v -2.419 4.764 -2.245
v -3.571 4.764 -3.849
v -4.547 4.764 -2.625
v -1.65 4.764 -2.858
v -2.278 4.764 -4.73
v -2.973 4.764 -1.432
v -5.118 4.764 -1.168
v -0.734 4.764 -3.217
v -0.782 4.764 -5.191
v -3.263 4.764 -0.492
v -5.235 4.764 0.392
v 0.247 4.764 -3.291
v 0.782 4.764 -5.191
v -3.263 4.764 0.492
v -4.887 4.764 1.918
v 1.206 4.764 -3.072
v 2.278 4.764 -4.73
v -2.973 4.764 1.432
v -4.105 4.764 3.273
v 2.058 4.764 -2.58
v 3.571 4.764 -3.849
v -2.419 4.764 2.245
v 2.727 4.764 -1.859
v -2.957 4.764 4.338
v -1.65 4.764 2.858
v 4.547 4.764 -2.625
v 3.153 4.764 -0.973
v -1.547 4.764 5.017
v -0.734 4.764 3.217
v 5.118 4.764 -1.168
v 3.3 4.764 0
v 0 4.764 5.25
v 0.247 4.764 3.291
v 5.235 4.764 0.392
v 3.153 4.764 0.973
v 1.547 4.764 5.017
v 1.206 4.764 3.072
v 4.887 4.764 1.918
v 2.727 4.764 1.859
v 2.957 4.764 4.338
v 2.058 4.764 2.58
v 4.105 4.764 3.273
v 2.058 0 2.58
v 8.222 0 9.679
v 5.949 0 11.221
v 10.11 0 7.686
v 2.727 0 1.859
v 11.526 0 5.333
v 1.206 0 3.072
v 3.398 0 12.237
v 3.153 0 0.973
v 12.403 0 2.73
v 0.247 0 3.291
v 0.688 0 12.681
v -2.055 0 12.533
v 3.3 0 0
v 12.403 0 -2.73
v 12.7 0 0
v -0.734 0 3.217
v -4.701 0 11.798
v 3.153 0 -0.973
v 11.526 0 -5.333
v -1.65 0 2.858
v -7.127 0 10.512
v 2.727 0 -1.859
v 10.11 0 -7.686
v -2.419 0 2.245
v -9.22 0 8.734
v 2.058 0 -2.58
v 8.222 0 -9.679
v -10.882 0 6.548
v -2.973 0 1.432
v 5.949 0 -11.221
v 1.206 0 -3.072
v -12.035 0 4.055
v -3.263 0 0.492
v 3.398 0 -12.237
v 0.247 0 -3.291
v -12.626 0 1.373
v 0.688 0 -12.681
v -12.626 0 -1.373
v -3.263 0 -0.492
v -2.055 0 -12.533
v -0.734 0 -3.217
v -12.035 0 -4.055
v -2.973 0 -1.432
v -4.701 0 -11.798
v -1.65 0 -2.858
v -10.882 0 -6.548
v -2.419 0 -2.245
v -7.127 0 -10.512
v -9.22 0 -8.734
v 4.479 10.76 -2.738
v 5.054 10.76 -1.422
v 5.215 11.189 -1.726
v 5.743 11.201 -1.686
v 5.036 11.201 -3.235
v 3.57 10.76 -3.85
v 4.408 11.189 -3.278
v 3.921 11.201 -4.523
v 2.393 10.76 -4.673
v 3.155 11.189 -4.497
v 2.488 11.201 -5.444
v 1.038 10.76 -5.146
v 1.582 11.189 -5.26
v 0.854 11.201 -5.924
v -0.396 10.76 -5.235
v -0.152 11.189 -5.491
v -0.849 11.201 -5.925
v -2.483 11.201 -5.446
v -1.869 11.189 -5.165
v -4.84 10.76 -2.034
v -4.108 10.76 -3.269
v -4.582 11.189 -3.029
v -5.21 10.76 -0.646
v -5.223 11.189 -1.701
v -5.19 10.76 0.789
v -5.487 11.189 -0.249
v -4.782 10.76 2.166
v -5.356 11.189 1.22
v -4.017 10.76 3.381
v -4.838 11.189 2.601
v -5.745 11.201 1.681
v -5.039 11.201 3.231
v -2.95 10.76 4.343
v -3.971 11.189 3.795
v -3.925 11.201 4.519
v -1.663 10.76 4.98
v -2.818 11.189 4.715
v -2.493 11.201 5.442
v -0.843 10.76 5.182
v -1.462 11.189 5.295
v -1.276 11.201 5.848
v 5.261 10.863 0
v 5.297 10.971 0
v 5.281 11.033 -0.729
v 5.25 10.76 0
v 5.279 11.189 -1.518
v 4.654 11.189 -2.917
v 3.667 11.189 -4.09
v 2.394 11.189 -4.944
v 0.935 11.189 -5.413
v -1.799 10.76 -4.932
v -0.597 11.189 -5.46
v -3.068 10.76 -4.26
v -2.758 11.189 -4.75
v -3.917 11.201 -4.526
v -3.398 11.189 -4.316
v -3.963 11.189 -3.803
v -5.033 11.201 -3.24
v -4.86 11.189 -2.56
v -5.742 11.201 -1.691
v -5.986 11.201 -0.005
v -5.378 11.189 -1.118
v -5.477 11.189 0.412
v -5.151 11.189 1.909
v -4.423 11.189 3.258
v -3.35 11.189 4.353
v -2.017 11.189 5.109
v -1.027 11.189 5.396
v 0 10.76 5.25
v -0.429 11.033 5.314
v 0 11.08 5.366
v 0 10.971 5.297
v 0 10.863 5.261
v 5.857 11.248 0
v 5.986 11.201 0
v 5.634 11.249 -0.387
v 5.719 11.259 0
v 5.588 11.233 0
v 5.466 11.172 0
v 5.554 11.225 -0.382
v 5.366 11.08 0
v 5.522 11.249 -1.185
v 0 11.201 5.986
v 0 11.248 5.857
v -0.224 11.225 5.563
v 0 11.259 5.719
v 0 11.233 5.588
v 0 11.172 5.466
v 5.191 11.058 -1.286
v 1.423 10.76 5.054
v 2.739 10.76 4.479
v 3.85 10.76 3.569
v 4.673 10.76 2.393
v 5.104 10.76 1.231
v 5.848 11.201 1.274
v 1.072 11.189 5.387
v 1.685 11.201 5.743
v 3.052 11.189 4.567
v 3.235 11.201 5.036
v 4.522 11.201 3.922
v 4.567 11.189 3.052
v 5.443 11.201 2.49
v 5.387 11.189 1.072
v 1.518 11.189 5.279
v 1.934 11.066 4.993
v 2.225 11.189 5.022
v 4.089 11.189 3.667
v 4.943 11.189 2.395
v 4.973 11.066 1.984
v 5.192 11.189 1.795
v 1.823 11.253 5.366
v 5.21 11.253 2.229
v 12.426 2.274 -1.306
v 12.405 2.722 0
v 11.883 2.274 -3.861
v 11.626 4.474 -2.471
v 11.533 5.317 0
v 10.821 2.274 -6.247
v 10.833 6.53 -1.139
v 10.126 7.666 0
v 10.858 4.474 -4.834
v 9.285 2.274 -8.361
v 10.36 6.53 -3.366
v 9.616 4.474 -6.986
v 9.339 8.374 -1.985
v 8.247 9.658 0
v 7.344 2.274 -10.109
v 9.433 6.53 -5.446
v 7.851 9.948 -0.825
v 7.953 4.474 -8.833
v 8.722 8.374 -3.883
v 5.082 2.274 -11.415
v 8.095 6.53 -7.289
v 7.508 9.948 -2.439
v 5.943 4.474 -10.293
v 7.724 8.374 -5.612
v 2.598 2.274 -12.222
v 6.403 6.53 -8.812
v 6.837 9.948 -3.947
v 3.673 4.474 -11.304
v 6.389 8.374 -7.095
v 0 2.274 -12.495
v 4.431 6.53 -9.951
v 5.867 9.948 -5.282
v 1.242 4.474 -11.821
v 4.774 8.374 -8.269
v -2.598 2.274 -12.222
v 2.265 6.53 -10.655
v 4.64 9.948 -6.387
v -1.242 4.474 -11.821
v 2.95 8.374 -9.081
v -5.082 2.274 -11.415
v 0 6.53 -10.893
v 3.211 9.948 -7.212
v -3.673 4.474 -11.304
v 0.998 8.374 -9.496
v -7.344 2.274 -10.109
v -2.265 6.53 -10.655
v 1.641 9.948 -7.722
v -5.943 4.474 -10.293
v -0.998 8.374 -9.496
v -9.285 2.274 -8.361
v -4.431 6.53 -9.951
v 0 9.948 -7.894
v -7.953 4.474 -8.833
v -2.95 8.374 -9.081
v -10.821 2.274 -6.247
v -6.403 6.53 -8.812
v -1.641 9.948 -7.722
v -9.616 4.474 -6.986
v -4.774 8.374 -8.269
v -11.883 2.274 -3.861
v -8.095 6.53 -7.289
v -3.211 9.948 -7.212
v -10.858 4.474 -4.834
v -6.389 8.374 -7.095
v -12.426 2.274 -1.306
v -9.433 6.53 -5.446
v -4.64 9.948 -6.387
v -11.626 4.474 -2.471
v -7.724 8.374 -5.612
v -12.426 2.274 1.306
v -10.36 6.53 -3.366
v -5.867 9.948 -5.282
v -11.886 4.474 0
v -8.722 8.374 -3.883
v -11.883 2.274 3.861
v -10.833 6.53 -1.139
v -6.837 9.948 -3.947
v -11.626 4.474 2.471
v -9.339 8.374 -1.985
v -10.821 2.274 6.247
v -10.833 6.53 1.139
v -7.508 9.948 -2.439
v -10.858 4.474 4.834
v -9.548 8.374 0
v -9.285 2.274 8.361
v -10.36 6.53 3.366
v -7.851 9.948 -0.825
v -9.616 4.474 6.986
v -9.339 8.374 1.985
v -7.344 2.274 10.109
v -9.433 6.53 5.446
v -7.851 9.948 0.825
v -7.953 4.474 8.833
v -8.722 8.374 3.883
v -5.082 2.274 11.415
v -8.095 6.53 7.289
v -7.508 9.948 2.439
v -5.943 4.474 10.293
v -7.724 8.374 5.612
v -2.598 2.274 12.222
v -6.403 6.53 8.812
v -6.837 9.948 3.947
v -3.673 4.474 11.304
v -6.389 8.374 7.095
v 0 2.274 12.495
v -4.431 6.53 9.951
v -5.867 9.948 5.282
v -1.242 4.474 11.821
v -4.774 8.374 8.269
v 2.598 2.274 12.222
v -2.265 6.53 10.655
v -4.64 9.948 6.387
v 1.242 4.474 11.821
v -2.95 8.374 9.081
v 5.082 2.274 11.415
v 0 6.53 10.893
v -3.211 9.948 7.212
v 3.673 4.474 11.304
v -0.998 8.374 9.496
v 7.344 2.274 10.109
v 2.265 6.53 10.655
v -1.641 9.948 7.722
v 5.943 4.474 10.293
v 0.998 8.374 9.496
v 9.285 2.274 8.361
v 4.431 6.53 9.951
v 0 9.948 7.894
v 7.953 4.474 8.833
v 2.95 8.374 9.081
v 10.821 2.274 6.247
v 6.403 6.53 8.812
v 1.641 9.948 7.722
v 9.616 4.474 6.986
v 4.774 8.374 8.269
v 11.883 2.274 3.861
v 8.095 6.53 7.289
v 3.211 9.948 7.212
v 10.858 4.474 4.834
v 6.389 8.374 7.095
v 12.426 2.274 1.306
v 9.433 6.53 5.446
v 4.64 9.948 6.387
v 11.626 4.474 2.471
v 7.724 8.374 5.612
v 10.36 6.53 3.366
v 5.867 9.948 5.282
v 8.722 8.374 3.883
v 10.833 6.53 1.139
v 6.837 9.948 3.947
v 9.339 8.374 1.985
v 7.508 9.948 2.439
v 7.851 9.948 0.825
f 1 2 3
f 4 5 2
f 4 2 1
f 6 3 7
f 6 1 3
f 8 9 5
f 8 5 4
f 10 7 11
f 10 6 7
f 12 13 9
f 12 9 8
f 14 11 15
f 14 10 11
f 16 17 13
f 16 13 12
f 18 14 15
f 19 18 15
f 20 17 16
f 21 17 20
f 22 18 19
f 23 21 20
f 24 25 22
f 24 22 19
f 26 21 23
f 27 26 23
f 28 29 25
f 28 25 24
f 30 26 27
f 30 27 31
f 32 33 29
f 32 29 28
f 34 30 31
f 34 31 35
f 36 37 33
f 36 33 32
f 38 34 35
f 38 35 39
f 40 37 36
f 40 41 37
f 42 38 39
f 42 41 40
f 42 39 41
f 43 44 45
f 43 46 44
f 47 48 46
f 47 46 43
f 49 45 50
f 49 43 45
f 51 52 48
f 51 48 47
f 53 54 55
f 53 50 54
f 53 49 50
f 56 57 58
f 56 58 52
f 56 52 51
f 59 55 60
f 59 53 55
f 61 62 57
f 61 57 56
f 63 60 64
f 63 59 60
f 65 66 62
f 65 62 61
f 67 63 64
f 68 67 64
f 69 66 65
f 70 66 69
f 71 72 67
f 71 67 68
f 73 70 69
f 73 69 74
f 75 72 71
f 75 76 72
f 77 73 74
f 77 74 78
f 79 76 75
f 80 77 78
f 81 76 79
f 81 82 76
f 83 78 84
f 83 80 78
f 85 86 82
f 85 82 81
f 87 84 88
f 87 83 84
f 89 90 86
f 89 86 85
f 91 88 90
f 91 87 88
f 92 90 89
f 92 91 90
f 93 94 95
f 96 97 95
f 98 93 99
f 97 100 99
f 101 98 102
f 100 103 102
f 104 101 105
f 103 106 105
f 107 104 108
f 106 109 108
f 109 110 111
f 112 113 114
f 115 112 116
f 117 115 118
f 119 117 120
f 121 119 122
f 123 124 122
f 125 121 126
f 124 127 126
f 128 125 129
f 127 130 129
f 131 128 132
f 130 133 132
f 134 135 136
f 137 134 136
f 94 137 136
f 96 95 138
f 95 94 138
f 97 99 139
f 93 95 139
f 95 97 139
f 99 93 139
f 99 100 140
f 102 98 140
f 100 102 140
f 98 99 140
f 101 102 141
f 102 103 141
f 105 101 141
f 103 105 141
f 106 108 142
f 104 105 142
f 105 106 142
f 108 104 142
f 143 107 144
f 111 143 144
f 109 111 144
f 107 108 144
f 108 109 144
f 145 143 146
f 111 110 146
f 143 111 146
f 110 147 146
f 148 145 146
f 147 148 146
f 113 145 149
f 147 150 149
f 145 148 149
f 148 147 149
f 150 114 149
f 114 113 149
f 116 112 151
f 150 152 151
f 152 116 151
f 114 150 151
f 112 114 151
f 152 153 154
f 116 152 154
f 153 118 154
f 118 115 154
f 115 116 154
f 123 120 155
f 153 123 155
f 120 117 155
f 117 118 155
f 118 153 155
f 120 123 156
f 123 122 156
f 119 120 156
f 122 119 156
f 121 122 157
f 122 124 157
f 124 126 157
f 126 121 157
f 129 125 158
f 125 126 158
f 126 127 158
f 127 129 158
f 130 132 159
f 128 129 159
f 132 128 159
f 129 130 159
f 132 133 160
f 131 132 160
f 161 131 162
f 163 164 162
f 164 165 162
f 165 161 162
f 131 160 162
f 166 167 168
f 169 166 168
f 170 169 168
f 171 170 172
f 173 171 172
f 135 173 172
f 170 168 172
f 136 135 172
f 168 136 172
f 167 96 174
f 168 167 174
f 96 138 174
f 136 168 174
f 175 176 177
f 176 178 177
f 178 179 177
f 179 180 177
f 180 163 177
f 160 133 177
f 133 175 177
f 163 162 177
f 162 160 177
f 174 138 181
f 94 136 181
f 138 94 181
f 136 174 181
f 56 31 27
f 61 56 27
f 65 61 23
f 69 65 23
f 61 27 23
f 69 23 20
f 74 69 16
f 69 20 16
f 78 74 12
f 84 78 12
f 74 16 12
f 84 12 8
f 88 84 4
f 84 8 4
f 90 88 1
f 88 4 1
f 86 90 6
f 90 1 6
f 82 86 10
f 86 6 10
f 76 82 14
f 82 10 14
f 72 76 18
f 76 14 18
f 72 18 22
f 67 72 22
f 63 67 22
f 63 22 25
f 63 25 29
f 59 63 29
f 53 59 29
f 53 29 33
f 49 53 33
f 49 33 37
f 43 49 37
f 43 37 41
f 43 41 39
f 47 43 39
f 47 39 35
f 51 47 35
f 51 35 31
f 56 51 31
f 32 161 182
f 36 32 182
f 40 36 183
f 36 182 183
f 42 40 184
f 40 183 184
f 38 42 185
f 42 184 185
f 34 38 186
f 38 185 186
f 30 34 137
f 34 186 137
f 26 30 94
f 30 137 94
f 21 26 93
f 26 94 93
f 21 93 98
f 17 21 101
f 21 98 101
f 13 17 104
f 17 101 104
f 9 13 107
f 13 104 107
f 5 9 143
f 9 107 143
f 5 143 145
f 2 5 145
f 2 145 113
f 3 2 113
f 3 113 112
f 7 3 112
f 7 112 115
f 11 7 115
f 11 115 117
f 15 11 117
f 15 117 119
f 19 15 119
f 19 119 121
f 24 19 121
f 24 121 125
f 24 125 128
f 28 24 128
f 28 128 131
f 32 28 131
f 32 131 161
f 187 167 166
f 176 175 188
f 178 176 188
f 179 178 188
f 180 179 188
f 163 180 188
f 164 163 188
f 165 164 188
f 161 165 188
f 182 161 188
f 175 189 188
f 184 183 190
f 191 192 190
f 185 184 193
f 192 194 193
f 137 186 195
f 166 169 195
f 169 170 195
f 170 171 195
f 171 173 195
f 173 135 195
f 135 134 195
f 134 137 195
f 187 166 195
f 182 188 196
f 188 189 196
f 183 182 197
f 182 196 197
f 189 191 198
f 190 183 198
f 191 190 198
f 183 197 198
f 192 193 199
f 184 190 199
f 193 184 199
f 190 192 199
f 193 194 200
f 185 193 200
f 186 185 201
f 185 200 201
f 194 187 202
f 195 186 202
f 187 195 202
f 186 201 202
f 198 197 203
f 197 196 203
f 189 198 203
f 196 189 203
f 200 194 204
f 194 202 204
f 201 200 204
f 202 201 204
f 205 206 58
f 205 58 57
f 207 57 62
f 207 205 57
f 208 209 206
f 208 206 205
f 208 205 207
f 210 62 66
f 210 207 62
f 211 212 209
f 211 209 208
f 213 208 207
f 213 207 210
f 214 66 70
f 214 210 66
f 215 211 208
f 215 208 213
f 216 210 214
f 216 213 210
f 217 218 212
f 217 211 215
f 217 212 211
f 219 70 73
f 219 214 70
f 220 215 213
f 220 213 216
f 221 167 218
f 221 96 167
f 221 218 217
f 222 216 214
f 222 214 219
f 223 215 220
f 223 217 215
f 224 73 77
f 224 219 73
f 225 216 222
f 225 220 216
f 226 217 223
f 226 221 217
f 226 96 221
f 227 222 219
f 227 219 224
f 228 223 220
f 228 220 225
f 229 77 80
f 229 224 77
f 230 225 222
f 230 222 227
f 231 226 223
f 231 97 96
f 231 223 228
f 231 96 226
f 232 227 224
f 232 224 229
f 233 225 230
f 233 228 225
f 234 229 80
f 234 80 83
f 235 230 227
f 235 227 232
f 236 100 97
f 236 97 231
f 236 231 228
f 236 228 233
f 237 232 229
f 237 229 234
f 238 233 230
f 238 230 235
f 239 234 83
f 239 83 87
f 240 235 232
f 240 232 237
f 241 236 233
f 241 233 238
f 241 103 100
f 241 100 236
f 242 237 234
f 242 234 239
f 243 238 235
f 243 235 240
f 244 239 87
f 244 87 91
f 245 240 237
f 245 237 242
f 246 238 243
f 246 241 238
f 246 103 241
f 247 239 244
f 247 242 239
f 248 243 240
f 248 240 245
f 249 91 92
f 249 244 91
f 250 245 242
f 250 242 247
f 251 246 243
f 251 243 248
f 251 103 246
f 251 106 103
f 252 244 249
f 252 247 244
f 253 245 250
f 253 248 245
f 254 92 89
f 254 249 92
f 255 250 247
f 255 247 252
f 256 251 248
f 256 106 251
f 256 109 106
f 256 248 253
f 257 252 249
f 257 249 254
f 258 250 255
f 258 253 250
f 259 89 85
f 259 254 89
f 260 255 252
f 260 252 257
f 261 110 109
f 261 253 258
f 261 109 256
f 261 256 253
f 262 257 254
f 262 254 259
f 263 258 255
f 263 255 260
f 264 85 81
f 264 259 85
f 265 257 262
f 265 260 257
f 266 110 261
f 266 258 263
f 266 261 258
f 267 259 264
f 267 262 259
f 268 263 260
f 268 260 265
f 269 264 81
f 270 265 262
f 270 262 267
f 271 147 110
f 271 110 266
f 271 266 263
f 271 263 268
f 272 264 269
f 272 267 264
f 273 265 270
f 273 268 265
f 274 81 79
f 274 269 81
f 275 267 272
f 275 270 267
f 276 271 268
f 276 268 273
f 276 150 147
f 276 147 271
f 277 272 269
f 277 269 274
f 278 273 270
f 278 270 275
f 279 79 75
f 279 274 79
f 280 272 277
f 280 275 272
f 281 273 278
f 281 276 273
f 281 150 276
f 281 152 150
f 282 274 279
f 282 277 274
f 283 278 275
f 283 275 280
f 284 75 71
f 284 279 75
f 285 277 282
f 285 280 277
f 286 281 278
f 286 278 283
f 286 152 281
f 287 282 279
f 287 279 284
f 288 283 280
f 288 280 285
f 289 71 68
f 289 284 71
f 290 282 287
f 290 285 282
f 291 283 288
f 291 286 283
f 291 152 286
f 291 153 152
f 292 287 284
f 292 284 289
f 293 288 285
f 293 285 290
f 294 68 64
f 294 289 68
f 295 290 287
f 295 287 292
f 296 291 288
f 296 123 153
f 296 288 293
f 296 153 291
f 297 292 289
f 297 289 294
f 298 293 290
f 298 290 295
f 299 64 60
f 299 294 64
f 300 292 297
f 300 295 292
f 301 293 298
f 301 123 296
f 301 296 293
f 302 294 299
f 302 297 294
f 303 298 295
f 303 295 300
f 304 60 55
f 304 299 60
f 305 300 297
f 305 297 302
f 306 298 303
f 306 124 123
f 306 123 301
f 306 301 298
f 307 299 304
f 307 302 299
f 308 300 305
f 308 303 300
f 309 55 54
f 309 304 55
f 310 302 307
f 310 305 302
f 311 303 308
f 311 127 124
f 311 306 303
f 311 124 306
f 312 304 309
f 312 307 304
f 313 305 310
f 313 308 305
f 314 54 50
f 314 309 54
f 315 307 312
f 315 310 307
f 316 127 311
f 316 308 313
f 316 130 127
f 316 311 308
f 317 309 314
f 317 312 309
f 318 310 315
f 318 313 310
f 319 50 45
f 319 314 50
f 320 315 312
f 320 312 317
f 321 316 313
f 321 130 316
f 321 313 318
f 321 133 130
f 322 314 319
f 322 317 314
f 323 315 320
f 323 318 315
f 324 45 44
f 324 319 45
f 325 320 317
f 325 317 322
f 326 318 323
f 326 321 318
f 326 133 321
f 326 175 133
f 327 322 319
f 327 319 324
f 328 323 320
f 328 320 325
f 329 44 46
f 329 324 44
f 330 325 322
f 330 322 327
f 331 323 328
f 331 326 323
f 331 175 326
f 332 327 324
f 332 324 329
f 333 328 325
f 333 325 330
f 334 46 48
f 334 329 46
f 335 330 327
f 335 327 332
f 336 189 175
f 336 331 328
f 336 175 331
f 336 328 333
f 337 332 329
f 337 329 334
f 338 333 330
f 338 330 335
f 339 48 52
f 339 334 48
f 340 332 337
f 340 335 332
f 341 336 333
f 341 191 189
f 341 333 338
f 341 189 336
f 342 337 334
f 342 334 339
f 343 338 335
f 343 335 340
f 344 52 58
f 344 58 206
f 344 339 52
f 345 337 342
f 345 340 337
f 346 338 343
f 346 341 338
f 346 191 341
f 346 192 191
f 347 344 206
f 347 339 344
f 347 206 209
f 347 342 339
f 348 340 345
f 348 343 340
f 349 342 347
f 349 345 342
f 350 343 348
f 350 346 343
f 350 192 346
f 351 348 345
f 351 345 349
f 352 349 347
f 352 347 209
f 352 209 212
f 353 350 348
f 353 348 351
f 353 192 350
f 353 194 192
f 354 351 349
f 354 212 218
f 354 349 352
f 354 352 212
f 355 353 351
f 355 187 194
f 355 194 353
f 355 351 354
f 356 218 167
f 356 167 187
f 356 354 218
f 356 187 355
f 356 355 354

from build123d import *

# Parameters (mm, degrees)
M6_CLEARANCE_HOLE1_D = 6.6
SKETCH6_R            = 5.25
CUT_EXTRUDE1_DEPTH   = 7.5
FILLET1_R            = 0.5


with BuildPart() as part:
    # Sketch2 → Revolve1 (revolve)
    with BuildSketch(Plane.XY):
        with BuildLine():
            Line((0, 0), (12.7, 0))
            ThreePointArc((12.7, 0), (8.980256121, 8.980256121), (0, 12.7))
            Line((0, 12.7), (0, 0))
        make_face()
    revolve(axis=Axis((0, 0, 0), (0, 1, 0)))

    # M6 Clearance Hole1 (through all)
    with Locations(Plane(origin=(0, 0, 0), x_dir=(-1, 0, 0), z_dir=(0, -1, 0))):
        with Locations((0, 0)):
            Hole(M6_CLEARANCE_HOLE1_D / 2)

    # Sketch6 → Cut-Extrude1 (cut)
    with BuildSketch(Plane(origin=(0, 12.263767773, 0), x_dir=(1, 0, 0), z_dir=(0, 1, 0))):
        with Locations(Location((0, 0, 0), (0, 0, 270))):
            Circle(SKETCH6_R)
    extrude(amount=-CUT_EXTRUDE1_DEPTH, mode=Mode.SUBTRACT)

    # Fillet1
    fillet1_edges = [part.edges().sort_by_distance(p)[0] for p in [
        (-3.712310601, 11.564060705, -3.712310601),
    ]]
    fillet(fillet1_edges, radius=FILLET1_R)


solid = part.part
